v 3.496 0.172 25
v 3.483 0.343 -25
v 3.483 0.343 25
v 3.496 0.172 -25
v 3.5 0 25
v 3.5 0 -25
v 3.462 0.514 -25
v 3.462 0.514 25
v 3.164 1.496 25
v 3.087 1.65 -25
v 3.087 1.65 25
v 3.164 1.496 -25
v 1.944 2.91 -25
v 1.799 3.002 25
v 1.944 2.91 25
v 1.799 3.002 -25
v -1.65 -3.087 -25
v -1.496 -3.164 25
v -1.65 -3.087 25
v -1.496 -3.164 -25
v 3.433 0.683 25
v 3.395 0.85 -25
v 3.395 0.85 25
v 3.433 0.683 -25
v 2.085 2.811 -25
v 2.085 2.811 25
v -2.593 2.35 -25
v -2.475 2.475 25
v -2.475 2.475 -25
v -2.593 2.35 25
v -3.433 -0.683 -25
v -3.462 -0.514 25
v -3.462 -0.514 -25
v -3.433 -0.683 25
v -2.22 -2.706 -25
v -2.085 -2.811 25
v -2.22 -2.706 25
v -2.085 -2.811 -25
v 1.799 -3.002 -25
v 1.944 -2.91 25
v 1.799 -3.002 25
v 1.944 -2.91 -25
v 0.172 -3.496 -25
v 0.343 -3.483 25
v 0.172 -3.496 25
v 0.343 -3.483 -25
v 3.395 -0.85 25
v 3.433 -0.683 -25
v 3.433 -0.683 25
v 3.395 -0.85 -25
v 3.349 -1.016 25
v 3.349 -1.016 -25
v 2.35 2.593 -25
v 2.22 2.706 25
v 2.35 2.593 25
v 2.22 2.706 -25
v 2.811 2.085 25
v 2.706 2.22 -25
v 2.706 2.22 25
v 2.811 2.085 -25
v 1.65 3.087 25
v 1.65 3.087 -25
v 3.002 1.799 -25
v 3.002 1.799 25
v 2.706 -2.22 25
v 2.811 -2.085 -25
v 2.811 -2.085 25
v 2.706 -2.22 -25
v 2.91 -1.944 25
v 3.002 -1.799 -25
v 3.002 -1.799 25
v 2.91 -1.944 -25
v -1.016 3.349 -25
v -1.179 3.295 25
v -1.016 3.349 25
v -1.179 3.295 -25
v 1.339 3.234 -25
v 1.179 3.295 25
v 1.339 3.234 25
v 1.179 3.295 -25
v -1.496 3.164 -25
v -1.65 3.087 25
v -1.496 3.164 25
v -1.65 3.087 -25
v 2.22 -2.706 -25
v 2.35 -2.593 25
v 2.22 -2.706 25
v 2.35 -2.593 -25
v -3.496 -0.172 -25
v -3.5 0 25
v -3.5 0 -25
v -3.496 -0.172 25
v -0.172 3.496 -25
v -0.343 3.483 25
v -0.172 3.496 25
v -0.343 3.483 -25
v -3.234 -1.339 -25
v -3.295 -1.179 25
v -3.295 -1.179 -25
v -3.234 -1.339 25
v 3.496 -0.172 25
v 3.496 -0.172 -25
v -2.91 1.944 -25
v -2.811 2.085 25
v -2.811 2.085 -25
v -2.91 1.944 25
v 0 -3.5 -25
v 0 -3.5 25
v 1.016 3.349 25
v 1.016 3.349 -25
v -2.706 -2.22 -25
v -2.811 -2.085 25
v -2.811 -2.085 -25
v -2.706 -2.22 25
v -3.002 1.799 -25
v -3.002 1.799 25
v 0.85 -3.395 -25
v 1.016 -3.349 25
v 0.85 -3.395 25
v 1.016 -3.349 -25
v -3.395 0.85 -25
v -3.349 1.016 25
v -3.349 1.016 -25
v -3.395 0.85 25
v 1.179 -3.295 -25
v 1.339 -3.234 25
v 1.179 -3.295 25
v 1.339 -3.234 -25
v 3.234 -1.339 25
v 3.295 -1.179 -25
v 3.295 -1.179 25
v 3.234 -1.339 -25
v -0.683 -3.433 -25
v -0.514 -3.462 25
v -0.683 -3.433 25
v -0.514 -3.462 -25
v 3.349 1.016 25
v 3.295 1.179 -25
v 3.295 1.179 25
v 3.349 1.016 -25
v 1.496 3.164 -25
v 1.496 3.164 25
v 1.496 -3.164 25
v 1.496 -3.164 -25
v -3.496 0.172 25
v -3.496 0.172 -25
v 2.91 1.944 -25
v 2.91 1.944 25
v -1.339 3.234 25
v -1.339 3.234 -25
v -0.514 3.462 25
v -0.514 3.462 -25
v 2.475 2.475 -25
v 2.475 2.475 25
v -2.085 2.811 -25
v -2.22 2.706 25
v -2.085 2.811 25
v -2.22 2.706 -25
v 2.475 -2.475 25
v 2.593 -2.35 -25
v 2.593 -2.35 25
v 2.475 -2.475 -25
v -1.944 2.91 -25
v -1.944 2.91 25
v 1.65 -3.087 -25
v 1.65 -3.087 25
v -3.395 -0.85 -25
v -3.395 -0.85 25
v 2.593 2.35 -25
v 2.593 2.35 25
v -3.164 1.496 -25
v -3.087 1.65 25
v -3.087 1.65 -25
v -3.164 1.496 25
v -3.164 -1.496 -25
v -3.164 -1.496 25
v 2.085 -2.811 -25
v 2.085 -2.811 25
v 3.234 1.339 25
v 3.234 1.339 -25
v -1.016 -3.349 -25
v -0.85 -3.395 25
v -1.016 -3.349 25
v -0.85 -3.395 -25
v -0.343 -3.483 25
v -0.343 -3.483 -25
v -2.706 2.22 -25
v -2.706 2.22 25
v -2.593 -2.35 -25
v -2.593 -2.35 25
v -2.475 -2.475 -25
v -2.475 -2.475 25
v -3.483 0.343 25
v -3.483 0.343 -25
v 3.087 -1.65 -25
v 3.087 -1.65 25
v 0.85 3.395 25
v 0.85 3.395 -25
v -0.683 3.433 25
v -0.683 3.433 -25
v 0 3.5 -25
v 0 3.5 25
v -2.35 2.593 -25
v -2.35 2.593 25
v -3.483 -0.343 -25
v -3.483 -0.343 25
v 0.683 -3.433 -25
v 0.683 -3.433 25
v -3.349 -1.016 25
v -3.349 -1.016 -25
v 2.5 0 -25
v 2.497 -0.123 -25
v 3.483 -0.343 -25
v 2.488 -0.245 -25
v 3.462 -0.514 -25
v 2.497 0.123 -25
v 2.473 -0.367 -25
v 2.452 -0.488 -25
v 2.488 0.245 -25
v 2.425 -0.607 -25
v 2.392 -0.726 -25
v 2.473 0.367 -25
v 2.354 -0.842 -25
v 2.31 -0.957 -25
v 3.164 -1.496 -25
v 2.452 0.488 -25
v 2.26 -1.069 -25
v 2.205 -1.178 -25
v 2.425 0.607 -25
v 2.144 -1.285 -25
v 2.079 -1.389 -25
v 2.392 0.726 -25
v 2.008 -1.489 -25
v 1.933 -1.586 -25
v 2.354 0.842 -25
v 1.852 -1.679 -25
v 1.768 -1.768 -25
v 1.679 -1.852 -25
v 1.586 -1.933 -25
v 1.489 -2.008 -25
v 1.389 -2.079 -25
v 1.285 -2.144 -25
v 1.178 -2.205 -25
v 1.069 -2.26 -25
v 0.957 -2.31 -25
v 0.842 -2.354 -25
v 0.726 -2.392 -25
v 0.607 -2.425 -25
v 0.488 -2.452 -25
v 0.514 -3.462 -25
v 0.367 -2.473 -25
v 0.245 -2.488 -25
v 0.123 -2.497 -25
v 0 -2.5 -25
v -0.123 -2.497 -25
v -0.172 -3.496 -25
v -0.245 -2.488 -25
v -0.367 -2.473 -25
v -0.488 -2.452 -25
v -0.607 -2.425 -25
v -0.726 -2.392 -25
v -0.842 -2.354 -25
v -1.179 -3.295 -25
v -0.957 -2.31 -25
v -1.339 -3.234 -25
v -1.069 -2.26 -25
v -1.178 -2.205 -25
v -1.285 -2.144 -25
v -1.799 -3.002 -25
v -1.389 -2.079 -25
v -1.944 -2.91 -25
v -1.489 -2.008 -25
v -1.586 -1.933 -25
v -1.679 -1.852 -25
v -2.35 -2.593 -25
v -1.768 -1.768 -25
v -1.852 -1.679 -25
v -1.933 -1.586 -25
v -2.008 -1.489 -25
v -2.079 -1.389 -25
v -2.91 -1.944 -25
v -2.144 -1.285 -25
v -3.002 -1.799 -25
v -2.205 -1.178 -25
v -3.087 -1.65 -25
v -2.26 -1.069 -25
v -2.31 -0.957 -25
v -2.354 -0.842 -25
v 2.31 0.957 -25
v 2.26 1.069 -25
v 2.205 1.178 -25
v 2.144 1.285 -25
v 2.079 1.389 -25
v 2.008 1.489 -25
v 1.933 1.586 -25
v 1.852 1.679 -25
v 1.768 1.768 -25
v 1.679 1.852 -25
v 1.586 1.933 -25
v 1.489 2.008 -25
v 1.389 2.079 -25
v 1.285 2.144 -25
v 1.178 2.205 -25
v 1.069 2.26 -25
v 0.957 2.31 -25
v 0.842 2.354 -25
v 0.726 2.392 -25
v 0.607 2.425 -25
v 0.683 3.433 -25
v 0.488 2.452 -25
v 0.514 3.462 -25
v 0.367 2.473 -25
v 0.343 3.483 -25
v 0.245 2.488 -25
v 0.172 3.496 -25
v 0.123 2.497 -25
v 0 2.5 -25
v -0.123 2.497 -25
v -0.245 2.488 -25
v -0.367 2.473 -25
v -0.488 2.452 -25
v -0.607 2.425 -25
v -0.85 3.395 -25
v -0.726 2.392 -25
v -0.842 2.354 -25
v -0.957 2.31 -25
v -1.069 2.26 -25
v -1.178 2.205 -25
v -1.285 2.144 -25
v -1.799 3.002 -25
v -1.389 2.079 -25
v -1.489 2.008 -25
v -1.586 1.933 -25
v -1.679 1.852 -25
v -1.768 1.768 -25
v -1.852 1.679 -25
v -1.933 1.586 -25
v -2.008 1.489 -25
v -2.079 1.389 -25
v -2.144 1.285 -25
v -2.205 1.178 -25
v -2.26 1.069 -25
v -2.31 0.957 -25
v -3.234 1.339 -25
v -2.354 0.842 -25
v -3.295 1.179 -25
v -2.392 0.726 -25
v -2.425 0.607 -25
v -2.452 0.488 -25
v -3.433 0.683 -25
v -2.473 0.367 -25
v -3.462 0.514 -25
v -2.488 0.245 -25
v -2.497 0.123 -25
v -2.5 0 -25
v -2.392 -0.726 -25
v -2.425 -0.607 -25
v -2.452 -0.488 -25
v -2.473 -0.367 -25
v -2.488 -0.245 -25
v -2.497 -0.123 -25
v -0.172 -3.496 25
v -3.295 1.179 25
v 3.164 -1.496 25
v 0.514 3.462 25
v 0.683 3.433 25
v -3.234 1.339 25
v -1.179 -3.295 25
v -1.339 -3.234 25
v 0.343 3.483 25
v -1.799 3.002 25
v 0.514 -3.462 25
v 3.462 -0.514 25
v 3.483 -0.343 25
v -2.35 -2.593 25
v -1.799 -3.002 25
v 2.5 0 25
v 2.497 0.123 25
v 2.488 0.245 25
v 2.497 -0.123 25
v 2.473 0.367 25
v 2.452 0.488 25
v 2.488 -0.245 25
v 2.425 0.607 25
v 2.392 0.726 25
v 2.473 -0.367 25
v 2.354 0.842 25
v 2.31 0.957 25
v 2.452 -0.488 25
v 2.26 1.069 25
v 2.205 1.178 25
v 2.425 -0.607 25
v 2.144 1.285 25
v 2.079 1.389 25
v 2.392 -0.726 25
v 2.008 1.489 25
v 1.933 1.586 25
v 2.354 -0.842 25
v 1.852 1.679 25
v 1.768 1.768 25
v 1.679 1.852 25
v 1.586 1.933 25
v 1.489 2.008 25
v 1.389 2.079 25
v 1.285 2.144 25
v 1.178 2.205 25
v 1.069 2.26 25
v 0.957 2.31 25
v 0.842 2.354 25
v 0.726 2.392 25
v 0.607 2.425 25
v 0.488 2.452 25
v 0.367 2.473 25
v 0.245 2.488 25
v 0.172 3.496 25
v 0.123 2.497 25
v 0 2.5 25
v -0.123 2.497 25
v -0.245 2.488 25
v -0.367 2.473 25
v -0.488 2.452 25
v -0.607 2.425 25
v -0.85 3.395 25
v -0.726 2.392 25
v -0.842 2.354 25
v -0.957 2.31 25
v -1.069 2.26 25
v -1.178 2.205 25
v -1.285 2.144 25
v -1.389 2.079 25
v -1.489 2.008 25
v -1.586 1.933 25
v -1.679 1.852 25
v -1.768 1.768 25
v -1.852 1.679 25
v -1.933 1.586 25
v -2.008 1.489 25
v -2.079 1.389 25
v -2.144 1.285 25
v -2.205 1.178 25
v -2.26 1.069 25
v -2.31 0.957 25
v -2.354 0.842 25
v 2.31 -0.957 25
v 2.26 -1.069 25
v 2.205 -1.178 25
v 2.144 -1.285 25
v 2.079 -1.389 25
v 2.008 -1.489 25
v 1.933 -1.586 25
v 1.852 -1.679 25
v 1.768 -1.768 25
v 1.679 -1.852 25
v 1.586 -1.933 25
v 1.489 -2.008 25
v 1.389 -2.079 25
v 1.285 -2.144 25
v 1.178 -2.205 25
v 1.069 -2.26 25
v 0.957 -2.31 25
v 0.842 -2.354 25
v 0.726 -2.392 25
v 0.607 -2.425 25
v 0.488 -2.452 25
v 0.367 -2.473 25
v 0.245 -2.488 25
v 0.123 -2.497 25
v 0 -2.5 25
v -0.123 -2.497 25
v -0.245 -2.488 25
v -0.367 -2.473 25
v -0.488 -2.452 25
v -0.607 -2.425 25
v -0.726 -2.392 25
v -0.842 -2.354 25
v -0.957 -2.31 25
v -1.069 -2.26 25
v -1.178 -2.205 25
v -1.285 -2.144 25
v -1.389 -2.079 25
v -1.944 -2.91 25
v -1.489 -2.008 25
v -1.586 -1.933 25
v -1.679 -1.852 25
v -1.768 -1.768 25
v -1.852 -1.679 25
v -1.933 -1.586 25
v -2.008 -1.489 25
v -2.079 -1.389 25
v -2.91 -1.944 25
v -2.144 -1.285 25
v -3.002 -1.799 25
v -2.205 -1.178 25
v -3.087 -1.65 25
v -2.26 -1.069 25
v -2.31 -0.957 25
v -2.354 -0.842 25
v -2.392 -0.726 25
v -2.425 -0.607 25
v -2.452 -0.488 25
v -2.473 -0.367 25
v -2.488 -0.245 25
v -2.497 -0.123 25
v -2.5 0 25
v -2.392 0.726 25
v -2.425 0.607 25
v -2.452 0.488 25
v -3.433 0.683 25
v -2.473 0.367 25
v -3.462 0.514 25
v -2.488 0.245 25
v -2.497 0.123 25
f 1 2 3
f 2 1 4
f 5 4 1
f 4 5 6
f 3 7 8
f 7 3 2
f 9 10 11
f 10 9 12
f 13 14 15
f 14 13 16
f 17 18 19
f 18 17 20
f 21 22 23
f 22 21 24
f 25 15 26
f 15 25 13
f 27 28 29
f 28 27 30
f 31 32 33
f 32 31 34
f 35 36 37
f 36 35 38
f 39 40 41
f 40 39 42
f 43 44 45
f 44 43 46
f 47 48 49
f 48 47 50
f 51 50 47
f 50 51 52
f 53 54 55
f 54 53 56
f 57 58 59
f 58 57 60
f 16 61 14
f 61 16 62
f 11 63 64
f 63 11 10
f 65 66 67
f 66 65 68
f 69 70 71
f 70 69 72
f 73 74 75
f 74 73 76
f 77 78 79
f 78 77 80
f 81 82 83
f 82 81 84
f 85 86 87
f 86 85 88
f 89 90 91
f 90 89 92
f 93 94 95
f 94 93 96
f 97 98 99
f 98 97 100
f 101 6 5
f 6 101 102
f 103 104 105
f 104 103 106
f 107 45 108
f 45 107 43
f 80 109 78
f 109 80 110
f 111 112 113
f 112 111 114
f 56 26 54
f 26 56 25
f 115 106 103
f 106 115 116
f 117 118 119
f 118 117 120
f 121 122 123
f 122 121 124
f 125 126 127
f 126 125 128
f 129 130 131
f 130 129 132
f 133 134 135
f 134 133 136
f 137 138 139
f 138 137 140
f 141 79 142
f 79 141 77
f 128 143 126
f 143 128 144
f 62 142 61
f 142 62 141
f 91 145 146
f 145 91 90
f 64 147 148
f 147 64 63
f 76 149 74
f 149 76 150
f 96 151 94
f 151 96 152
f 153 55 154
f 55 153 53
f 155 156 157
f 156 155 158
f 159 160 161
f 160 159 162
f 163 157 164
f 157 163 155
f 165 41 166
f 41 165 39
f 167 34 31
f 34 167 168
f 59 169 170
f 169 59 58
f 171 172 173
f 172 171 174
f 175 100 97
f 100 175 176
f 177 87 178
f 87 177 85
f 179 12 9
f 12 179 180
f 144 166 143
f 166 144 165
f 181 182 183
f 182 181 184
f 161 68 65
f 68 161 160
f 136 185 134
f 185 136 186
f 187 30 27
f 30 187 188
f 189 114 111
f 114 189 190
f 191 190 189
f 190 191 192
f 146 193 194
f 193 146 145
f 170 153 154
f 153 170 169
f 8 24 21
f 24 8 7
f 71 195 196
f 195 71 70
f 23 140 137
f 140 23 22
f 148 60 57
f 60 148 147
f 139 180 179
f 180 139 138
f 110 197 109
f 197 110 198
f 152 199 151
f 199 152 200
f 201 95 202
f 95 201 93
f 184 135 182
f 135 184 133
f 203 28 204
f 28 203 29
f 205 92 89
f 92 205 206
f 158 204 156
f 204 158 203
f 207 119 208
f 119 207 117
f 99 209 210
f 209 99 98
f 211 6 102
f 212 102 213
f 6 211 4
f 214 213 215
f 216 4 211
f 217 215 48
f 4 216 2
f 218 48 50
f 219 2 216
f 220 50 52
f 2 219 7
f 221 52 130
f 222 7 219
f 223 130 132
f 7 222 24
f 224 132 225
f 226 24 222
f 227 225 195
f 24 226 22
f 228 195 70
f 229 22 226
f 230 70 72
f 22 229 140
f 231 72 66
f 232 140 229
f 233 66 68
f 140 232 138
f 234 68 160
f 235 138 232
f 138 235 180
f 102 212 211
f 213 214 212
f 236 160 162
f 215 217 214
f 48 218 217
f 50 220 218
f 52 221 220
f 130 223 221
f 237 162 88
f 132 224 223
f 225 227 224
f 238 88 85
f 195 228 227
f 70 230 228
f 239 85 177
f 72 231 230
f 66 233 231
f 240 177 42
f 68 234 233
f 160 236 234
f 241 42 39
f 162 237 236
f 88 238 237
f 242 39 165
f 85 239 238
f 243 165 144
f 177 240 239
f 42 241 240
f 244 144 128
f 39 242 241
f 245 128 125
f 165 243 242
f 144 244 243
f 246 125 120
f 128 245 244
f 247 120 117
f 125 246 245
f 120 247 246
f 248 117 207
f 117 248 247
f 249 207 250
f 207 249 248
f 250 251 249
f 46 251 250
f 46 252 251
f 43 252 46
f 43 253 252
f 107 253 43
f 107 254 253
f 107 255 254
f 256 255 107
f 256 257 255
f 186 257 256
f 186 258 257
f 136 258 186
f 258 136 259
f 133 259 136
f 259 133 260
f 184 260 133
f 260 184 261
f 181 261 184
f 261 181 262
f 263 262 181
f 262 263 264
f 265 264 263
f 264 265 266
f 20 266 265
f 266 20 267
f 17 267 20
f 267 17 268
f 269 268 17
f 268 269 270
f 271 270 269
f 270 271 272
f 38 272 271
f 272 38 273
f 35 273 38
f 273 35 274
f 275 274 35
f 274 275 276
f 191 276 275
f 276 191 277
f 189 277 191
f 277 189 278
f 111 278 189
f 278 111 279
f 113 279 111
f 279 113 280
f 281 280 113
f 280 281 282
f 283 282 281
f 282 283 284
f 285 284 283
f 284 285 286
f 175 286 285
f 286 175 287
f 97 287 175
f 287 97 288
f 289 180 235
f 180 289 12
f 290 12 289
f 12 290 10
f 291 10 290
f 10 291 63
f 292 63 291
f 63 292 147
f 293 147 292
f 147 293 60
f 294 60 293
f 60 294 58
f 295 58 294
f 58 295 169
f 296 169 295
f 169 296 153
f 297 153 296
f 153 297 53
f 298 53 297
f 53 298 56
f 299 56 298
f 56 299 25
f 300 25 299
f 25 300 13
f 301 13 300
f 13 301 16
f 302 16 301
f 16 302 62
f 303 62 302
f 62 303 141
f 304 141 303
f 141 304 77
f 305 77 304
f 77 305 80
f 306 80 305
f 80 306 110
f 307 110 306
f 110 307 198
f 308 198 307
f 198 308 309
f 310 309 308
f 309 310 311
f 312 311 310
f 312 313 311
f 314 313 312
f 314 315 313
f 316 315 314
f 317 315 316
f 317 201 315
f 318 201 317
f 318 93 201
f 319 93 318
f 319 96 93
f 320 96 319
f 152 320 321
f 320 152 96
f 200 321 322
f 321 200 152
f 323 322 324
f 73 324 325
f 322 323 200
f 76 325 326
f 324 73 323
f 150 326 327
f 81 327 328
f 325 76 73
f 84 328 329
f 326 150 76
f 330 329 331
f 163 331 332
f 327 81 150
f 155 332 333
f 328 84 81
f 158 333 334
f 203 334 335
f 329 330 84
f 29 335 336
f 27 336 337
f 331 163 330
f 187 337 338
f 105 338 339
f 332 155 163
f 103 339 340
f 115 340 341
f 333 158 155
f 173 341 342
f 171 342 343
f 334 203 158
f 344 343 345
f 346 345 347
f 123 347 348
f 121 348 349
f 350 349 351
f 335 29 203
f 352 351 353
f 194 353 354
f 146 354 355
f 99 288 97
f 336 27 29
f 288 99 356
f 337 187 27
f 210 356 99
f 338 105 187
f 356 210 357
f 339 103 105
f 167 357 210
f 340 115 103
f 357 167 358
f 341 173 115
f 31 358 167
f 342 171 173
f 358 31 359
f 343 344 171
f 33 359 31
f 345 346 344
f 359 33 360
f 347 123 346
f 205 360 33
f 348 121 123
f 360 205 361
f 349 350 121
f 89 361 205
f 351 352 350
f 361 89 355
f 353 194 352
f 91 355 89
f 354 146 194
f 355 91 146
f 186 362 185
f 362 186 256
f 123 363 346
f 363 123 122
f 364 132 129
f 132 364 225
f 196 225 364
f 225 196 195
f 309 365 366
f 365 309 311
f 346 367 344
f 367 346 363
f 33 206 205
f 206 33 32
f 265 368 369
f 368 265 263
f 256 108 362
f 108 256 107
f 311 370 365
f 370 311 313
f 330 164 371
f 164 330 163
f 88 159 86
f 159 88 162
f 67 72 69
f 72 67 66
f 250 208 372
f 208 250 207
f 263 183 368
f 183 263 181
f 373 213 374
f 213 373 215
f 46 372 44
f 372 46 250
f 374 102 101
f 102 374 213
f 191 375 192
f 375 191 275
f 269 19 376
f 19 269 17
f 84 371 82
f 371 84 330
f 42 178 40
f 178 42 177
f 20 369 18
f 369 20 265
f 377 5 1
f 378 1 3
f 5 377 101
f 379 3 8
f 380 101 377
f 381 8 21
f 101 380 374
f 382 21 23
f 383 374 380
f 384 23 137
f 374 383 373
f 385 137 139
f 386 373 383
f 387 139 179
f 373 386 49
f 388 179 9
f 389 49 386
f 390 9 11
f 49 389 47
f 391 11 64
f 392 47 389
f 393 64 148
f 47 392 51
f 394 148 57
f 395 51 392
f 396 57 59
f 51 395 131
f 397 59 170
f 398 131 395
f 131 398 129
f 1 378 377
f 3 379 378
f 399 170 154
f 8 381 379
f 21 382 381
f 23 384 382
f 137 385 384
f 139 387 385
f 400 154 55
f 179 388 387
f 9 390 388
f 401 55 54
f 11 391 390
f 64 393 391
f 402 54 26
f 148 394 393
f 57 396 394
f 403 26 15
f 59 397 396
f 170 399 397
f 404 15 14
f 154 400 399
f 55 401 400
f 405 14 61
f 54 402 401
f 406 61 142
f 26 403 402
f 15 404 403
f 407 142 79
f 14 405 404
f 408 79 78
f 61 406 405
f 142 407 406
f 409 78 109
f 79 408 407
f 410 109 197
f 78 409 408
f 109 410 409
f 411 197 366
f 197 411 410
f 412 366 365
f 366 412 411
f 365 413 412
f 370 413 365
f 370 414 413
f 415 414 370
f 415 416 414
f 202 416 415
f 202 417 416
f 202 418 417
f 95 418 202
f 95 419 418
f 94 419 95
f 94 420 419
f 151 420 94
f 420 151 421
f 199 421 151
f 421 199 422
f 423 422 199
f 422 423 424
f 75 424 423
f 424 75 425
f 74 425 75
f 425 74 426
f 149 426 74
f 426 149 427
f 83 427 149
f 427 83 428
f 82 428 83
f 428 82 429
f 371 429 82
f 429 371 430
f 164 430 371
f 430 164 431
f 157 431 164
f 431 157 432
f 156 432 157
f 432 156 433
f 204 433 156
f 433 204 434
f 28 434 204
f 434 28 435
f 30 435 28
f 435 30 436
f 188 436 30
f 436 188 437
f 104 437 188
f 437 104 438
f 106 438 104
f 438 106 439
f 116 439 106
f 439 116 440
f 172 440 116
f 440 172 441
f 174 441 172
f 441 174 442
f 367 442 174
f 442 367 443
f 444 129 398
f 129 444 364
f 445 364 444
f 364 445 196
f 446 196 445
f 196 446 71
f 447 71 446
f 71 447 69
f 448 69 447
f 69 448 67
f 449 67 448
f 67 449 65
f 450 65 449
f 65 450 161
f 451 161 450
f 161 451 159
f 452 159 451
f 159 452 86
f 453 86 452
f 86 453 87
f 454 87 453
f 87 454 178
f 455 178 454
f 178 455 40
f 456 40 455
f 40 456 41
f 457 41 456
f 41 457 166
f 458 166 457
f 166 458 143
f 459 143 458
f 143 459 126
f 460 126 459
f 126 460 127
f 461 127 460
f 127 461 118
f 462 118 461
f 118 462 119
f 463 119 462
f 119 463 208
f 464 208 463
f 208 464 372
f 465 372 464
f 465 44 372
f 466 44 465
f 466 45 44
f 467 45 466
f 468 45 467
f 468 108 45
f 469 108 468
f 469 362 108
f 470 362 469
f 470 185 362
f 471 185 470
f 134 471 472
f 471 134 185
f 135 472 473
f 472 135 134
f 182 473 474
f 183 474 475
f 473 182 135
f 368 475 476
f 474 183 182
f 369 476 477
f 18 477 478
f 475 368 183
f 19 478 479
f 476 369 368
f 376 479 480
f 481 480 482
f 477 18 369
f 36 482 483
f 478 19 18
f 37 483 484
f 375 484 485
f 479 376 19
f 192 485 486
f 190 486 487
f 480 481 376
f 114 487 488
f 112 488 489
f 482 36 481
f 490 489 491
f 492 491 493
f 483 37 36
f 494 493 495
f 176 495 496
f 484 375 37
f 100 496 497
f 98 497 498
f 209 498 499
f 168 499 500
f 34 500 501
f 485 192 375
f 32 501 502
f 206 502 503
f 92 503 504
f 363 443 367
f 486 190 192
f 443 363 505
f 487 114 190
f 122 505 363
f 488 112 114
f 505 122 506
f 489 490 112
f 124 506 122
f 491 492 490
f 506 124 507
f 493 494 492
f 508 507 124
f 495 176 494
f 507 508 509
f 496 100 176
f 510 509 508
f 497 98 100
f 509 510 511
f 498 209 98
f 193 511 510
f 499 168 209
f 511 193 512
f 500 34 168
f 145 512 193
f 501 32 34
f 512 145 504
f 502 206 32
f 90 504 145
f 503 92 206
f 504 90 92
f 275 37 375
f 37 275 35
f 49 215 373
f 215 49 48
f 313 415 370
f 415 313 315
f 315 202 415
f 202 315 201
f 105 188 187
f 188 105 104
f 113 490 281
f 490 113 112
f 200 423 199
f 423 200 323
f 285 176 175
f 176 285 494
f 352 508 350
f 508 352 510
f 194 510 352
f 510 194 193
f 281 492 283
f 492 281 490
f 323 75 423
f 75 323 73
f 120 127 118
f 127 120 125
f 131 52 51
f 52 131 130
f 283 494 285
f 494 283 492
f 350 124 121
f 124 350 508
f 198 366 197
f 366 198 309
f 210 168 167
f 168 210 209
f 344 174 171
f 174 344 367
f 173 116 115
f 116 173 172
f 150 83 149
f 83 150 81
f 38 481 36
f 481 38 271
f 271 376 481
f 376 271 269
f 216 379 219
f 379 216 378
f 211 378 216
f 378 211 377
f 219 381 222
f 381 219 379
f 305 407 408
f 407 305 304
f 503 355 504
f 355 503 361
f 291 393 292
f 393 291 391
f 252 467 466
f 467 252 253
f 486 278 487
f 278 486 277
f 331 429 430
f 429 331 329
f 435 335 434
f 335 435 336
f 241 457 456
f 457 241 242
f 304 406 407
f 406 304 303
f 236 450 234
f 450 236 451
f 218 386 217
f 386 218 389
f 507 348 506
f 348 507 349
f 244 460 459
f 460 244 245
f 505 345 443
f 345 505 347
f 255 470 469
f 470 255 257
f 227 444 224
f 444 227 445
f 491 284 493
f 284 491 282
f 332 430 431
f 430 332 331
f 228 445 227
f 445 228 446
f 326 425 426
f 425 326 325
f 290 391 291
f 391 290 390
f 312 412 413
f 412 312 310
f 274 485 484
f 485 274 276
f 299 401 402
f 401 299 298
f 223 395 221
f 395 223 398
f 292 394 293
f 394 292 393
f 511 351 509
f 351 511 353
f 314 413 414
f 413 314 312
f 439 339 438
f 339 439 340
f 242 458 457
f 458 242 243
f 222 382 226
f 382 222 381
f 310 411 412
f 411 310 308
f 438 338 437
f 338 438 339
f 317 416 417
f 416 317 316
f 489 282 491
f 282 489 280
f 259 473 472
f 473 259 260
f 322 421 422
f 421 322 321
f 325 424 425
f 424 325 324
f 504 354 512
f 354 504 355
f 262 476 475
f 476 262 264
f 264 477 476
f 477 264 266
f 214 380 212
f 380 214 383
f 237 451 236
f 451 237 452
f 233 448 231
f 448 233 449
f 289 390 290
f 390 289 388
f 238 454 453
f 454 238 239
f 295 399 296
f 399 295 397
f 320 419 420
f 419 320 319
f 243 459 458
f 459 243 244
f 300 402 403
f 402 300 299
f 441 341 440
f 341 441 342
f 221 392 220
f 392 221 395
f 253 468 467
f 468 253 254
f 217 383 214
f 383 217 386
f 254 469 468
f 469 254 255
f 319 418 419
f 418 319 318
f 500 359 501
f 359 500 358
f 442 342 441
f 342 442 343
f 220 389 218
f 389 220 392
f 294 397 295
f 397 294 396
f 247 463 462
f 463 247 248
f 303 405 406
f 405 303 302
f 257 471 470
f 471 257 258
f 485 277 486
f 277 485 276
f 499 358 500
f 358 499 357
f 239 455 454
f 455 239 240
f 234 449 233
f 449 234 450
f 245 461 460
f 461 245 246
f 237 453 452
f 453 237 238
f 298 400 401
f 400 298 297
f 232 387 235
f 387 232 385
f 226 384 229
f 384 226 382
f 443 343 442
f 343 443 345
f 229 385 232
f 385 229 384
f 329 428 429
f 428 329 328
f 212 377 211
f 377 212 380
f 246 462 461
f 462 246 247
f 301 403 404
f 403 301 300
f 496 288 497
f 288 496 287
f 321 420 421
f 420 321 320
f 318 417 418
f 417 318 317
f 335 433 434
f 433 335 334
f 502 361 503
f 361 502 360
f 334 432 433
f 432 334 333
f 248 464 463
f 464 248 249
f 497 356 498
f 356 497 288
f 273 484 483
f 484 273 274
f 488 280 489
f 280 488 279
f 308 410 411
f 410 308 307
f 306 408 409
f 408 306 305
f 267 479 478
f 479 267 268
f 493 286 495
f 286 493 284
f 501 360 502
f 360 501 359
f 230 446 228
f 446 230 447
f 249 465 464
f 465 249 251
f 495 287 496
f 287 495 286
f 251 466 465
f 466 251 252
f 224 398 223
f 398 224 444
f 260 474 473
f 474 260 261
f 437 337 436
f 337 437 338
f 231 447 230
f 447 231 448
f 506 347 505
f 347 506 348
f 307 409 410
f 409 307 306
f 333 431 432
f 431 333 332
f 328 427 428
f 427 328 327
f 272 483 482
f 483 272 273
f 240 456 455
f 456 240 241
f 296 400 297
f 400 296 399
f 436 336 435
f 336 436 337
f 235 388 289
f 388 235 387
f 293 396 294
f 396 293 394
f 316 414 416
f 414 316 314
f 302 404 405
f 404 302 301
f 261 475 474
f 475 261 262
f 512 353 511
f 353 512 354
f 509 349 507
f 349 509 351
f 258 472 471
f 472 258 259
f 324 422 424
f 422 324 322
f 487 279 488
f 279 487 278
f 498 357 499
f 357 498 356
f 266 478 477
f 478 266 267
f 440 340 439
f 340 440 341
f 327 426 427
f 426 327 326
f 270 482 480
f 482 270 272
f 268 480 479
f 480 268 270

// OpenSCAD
$fn = 128;

// Heatshrink sleeving parameters
inner_diameter = 5;   // ID
outer_diameter = 7;   // OD
length         = 50;  // overall length

// Small overlap to avoid coincident faces in boolean ops
eps = 0.2;

// One connected solid: a hollow tube (sleeve)
module heatshrink_sleeve() {
    difference() {
        // Outer wall
        cylinder(h = length, d = outer_diameter, center = true);

        // Inner bore (slightly longer so it fully cuts through)
        cylinder(h = length + 2*eps, d = inner_diameter, center = true);
    }
}

heatshrink_sleeve();
